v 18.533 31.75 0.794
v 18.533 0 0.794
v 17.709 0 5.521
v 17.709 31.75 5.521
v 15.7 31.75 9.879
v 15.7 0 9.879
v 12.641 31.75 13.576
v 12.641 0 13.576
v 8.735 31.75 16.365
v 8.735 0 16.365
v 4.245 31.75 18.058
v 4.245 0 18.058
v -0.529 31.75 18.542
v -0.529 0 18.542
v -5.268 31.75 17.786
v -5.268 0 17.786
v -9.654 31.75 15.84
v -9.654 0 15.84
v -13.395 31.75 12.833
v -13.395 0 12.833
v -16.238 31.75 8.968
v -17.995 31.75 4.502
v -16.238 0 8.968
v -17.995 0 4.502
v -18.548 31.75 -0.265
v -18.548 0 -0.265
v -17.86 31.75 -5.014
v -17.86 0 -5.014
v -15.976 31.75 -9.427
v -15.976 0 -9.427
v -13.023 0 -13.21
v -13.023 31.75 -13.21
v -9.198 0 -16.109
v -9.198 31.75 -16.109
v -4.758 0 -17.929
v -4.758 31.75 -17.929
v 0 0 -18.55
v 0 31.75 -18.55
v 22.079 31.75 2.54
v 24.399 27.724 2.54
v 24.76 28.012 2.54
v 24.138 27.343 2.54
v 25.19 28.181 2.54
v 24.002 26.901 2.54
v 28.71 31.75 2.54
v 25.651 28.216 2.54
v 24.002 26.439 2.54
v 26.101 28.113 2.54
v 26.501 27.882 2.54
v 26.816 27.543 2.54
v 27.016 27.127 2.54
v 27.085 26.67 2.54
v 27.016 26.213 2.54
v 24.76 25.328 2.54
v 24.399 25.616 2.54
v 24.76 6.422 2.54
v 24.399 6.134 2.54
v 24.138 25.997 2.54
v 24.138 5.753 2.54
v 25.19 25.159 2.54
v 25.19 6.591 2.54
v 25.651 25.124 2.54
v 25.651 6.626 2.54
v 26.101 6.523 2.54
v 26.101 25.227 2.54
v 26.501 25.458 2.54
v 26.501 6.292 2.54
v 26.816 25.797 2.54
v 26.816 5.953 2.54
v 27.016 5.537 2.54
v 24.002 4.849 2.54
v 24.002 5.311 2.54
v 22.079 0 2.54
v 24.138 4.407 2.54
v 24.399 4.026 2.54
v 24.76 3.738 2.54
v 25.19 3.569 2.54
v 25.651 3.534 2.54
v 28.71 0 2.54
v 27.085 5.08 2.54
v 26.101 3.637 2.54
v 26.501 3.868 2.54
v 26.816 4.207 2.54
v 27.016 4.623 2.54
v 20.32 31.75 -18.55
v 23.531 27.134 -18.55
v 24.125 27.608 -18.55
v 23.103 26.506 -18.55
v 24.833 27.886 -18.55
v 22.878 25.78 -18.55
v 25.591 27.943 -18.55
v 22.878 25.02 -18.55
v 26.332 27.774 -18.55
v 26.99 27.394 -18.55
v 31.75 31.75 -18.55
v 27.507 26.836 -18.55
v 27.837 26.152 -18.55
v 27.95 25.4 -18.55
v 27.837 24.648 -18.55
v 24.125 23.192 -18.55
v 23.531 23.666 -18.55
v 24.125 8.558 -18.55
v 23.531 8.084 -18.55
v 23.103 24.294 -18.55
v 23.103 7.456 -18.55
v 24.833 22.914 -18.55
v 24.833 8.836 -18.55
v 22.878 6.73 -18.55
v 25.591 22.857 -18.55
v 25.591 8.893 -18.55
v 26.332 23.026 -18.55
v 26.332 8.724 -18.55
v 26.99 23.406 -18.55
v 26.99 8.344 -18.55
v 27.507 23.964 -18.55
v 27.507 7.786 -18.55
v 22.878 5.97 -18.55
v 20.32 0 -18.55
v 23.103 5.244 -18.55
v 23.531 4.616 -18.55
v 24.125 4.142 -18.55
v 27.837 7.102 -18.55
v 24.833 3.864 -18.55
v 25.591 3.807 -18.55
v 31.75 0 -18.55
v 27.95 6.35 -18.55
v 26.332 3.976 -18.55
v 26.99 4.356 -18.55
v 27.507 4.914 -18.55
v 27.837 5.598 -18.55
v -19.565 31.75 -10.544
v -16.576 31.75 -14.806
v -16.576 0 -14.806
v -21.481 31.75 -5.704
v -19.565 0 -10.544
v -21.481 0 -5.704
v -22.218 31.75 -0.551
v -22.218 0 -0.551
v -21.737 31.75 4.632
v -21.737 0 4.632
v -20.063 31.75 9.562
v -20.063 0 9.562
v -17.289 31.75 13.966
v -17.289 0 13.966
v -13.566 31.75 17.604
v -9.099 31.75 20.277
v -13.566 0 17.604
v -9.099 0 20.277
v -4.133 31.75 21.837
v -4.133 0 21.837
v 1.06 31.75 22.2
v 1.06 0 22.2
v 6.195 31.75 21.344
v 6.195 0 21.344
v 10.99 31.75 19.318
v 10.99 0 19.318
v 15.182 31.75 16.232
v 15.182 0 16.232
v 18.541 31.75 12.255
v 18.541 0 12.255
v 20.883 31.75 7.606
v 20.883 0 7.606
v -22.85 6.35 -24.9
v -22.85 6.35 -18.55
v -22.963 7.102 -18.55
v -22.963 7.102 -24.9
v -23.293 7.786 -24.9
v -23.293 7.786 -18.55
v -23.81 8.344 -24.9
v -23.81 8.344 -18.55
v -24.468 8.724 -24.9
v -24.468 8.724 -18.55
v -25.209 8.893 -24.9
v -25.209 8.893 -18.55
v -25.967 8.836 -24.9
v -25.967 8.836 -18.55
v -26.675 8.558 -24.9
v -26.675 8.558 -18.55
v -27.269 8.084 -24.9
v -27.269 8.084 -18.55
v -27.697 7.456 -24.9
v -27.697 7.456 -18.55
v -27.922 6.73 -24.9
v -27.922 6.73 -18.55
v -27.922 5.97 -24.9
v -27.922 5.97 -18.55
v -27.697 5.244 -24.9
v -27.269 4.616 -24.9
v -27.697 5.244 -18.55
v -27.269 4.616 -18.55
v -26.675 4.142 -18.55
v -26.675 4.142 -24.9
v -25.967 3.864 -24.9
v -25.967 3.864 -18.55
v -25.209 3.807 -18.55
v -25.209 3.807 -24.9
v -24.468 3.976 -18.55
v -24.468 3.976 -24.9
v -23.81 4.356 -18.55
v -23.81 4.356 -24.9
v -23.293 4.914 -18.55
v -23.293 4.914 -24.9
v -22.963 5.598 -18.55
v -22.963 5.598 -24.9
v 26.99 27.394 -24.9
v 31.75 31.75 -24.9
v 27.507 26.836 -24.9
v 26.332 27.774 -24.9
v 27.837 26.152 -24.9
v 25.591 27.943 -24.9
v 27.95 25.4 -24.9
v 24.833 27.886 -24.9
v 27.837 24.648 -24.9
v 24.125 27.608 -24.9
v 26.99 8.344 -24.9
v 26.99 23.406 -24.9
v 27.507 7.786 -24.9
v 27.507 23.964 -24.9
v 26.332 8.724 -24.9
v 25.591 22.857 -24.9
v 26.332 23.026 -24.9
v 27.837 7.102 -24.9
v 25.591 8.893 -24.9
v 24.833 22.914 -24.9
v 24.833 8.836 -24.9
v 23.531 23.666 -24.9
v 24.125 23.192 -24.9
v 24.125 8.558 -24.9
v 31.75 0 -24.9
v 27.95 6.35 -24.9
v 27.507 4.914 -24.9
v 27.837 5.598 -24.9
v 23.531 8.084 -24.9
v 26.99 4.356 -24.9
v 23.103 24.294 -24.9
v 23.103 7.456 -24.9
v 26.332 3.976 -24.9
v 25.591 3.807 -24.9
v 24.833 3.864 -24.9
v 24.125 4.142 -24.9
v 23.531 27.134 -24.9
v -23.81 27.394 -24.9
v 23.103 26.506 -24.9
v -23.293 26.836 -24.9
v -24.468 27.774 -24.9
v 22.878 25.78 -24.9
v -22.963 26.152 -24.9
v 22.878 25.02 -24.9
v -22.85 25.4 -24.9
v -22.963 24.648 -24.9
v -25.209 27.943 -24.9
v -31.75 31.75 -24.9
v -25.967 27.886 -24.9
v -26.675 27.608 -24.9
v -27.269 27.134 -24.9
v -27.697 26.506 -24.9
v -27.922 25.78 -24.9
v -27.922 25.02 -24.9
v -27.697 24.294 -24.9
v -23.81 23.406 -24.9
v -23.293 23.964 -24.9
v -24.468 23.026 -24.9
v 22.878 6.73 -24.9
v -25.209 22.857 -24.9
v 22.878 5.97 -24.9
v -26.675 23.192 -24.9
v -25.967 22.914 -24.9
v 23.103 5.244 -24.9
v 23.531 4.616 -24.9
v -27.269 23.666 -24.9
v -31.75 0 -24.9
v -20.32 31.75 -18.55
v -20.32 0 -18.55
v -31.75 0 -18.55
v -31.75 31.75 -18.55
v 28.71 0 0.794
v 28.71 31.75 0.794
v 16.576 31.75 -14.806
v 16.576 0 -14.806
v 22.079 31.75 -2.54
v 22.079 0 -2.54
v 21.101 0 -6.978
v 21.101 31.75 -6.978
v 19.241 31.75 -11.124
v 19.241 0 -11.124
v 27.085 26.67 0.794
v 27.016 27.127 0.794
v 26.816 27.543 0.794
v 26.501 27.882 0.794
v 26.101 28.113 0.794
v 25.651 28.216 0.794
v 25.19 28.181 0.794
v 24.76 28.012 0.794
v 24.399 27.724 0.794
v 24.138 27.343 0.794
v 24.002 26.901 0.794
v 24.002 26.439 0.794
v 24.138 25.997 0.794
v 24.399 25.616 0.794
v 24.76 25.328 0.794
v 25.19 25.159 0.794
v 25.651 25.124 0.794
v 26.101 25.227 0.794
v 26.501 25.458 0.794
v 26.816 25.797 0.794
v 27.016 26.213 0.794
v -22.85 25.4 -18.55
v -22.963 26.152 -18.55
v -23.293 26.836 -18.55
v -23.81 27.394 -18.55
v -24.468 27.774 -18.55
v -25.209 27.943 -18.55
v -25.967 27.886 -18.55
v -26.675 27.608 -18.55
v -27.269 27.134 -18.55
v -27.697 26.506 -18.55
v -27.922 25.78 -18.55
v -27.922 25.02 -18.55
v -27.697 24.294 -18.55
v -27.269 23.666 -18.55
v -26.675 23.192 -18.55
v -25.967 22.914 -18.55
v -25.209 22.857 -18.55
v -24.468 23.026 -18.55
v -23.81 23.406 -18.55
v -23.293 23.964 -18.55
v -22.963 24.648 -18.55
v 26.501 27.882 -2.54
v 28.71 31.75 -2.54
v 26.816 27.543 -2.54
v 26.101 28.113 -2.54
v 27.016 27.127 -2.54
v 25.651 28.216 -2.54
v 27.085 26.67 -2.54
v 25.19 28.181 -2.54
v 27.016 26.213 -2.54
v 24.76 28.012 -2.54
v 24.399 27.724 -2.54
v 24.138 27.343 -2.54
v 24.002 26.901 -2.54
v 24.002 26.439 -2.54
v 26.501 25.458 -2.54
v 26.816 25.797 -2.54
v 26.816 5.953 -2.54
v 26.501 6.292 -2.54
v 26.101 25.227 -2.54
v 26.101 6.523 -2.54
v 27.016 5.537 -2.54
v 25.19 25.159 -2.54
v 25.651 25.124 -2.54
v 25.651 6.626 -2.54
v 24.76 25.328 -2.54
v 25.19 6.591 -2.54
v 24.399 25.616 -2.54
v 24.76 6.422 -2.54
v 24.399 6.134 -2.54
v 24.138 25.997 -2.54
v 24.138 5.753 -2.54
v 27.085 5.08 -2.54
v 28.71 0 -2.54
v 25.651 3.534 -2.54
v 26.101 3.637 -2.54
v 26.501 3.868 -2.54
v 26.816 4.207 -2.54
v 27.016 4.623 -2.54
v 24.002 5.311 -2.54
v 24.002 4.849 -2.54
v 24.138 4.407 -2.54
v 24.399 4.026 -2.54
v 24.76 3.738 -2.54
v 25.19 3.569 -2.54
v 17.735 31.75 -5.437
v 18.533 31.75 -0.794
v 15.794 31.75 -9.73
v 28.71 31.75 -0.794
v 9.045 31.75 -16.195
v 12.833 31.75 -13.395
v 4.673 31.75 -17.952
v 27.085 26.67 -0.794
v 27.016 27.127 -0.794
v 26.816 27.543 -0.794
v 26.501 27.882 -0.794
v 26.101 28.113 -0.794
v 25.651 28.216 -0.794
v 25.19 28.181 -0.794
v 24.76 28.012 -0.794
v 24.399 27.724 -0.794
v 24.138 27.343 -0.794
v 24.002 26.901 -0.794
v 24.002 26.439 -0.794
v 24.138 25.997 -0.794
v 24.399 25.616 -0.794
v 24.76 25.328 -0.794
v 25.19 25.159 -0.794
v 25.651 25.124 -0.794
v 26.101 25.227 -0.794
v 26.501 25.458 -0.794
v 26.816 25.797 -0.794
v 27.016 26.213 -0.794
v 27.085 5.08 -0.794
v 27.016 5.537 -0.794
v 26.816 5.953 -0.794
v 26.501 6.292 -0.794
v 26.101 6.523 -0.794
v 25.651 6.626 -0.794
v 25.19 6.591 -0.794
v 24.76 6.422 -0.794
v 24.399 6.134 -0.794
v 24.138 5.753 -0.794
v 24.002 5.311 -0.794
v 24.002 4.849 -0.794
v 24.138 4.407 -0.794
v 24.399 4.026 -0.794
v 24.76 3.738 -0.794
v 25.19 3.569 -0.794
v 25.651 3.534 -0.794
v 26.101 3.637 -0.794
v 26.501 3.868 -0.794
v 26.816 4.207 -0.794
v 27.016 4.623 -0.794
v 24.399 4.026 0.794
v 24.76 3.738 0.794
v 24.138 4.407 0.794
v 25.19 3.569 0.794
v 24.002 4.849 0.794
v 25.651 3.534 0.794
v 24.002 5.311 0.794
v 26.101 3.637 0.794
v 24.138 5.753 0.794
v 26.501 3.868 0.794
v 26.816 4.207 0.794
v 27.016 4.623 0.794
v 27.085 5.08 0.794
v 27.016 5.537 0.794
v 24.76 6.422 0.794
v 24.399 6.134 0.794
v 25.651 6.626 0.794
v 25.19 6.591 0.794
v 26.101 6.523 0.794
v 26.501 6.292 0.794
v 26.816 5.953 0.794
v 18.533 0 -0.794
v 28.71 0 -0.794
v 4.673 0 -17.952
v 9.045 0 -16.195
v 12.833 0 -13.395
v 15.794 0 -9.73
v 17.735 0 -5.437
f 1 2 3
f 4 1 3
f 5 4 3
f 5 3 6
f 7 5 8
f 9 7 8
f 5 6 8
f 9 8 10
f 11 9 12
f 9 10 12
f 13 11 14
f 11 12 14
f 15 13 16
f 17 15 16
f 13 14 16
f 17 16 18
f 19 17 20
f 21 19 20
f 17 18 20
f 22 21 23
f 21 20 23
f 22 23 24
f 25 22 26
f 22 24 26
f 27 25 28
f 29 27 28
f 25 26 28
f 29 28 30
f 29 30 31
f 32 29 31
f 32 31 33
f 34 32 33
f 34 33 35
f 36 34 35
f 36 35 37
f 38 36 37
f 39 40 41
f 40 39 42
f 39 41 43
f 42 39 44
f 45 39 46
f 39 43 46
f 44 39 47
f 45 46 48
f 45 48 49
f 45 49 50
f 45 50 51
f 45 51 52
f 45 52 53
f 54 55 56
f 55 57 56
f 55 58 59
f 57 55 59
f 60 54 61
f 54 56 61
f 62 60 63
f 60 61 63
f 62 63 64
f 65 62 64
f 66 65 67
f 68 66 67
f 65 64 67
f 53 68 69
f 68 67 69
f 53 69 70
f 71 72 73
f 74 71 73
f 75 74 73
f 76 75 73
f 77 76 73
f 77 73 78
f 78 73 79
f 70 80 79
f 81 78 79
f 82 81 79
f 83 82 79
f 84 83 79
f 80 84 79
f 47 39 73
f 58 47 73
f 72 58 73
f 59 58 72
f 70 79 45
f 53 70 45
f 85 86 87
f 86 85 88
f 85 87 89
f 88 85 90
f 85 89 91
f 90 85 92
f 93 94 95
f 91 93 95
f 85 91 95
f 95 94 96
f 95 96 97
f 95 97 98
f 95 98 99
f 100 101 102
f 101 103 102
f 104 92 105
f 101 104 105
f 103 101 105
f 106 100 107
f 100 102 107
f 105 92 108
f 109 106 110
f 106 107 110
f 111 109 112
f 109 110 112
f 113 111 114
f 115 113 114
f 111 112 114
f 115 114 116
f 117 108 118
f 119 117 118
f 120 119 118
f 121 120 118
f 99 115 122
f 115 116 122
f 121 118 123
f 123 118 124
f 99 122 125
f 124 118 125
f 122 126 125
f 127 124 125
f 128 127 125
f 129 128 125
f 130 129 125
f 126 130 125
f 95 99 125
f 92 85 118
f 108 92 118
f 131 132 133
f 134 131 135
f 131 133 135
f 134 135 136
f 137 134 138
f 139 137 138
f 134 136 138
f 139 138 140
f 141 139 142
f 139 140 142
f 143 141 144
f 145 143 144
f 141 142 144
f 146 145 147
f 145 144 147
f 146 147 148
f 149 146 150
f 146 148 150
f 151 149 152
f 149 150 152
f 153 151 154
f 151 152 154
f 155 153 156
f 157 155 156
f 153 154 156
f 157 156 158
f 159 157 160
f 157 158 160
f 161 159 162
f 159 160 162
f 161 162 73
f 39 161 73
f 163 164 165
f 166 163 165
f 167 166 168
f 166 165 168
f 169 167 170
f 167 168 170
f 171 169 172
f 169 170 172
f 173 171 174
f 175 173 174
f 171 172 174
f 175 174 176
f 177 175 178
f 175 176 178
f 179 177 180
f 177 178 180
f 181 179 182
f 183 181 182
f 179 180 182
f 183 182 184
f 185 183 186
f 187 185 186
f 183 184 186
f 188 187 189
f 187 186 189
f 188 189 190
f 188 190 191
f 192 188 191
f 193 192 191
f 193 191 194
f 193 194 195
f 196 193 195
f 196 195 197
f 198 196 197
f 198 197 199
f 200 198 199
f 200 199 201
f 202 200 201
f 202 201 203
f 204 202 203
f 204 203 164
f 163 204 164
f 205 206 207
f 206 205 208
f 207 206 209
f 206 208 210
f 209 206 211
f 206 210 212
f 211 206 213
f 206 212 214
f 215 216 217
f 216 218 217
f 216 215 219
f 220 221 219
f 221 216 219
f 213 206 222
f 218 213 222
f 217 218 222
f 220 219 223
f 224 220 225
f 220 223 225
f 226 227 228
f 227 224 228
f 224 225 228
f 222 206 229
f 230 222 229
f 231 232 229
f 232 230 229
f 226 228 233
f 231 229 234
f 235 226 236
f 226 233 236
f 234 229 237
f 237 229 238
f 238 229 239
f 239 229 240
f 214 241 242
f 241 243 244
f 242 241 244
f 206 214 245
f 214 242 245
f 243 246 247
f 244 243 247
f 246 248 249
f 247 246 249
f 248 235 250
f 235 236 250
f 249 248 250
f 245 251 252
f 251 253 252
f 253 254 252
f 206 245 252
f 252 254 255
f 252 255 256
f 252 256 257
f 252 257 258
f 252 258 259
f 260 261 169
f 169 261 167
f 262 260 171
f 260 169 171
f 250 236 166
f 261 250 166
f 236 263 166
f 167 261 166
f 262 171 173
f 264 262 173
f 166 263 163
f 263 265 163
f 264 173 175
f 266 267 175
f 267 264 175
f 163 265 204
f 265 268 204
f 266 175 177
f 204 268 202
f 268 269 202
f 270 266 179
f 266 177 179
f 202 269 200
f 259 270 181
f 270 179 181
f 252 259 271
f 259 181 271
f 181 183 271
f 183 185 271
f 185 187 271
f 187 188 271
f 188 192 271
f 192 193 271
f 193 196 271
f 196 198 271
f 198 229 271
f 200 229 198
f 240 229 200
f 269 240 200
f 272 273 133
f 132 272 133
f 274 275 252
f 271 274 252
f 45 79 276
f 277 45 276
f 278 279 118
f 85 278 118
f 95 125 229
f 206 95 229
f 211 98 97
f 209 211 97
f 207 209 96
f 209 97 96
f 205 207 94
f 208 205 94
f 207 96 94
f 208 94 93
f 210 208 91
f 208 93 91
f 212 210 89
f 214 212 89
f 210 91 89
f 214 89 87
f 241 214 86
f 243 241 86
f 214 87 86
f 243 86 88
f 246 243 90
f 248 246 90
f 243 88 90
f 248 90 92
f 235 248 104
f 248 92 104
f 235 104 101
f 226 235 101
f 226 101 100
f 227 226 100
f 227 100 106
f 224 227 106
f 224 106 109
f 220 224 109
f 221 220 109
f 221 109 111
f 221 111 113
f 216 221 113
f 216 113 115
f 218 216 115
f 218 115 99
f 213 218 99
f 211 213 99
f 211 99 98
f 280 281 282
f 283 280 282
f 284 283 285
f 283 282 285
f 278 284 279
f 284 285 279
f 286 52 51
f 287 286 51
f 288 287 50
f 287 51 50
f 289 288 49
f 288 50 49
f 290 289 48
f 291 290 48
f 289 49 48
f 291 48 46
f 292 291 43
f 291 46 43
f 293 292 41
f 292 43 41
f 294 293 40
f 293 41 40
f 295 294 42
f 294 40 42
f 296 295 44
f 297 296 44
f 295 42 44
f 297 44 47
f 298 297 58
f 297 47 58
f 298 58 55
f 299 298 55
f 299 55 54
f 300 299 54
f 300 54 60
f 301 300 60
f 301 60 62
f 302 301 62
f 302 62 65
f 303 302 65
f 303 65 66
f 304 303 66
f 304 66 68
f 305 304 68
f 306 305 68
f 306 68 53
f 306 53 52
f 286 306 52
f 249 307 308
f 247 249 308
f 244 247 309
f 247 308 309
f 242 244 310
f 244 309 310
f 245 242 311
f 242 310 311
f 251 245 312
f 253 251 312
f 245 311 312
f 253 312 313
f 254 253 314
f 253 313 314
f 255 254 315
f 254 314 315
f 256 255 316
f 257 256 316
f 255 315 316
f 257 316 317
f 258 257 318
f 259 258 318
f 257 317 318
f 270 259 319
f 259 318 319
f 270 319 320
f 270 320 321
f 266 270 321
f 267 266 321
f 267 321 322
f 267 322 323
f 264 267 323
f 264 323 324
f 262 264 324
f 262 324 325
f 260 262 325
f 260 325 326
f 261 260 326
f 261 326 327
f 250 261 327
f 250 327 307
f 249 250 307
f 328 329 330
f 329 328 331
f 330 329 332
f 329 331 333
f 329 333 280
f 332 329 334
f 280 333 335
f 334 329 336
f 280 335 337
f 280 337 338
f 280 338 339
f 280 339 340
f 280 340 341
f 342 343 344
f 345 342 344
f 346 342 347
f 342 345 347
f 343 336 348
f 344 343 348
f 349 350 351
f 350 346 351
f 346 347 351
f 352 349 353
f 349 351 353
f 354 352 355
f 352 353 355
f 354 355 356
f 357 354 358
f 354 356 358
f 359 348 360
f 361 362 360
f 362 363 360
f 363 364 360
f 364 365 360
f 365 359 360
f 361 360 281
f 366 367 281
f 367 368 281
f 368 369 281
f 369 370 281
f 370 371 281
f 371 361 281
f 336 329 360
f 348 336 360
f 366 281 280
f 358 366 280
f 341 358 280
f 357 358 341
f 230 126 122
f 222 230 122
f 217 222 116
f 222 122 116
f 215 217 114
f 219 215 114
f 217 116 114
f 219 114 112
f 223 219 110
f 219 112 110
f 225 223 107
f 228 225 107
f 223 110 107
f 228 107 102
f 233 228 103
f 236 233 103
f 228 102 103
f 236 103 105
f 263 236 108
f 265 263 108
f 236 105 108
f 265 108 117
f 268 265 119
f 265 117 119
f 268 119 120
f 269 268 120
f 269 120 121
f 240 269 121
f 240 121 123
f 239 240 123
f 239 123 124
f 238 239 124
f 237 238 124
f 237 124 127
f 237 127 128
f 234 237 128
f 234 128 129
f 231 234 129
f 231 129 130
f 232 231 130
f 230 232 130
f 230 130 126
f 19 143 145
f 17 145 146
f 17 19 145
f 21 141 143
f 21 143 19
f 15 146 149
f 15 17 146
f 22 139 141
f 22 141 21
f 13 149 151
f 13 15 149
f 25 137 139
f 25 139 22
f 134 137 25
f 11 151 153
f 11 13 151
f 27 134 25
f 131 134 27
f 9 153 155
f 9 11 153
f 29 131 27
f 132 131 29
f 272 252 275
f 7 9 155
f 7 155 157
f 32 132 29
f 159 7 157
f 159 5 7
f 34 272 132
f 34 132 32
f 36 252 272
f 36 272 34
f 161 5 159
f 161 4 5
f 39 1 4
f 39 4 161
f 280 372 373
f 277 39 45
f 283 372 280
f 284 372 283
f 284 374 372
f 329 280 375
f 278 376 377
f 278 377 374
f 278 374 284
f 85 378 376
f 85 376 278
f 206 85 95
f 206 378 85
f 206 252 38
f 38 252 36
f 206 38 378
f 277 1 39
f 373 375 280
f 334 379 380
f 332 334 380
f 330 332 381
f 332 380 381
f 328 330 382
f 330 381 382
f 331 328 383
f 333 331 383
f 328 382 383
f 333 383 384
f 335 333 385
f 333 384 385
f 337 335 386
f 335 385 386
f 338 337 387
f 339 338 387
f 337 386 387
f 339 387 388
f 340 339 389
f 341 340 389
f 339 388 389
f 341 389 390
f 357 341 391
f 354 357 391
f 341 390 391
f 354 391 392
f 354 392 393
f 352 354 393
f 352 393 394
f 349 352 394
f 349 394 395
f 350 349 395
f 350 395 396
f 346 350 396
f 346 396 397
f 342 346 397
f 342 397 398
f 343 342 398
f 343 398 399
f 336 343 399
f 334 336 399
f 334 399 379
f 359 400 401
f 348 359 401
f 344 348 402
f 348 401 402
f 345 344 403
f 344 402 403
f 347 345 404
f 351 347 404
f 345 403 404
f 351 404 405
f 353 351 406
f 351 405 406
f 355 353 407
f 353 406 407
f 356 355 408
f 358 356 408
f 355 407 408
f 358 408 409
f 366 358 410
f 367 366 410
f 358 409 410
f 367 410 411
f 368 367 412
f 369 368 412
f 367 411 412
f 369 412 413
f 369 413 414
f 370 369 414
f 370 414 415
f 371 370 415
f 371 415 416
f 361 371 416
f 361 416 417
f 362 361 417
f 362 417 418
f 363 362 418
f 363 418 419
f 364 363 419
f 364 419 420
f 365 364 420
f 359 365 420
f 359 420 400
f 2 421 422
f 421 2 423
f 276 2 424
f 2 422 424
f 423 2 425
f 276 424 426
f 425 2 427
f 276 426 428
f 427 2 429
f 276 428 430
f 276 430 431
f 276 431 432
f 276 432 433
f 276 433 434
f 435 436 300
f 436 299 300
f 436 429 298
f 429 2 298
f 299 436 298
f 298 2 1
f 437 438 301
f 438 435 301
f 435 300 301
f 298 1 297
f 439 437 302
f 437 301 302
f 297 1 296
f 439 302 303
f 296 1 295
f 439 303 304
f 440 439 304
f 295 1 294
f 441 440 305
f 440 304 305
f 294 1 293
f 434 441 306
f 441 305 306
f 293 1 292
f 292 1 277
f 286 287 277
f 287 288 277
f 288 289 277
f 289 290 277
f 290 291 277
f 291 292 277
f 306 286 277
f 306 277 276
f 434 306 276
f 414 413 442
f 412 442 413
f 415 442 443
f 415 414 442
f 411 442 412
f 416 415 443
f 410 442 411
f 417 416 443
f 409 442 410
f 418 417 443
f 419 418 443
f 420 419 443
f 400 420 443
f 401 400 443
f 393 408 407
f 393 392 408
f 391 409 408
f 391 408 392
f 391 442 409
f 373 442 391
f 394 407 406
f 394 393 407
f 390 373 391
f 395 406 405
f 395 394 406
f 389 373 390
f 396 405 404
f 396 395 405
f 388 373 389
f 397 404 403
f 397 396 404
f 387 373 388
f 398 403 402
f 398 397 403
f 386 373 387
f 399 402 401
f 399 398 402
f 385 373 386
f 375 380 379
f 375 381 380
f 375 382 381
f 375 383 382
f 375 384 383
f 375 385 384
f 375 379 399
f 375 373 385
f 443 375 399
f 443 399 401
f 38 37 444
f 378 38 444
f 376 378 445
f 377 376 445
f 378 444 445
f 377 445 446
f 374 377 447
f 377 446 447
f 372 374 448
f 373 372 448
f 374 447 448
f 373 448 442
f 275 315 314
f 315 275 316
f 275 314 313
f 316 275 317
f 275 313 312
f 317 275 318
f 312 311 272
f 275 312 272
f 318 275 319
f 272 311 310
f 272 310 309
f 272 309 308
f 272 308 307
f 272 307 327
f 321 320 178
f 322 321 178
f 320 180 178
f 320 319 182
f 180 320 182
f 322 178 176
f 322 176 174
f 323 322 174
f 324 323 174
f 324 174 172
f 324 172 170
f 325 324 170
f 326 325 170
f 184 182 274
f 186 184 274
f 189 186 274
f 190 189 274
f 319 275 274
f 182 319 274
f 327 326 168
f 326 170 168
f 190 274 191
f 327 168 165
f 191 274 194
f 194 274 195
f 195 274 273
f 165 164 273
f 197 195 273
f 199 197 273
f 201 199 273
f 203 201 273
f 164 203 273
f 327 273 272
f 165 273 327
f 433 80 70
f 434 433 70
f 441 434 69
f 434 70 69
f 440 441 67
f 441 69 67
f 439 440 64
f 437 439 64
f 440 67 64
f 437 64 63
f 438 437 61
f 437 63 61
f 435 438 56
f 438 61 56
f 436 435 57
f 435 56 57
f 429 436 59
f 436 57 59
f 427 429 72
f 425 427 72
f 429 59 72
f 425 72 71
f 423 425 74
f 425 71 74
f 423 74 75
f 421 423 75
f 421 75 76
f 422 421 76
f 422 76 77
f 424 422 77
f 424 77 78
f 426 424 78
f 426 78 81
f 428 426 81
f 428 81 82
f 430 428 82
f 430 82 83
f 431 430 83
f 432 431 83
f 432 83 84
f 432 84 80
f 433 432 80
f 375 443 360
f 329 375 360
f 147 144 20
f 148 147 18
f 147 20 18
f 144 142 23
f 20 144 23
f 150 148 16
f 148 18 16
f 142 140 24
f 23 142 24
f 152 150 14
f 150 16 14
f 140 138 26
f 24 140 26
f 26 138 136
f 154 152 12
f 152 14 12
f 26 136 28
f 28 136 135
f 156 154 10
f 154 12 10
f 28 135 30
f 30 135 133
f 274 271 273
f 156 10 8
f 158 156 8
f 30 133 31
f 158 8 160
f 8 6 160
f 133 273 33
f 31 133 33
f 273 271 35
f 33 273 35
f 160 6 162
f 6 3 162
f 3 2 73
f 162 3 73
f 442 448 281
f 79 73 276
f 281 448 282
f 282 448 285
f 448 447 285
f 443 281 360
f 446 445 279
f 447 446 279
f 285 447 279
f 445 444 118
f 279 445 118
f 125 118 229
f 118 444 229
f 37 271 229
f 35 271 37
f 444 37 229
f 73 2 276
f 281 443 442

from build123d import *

# Parameters (mm, degrees)
SKETCH1_W           = 3
SKETCH1_H           = 5.08
SKETCH1_W_2         = 1.910737821
SKETCH1_W_3         = 5
SKETCH1_H_2         = 6.35
SKETCH1_W_4         = 3.175
BOSS_EXTRUDE1_DEPTH = 31.75
SKETCH2_W           = 21.412406597
SKETCH2_H           = 1.5875
CUT_EXTRUDE1_DEPTH  = 31.75
CUT_EXTRUDE2_REACH  = 54.622
SKETCH3_R           = 1.55
SKETCH4_R           = 2.55
CUT_EXTRUDE3_DEPTH  = 31.75


with BuildPart() as part:
    # Sketch1 → Boss-Extrude1 (new body)
    with BuildSketch(Plane(origin=(0, 0, 0), x_dir=(1, 0, 0), z_dir=(0, 1, 0))):
        with BuildLine():
            ThreePointArc((18.55, 0), (-13.116830791, -13.116830791), (0, 18.55))
            Line((0, 18.55), (-12.241246873, 18.55))
            ThreePointArc((-12.241246873, 18.55), (-14.529510105, 16.817965427), (-16.575509472, 14.805509472))
            ThreePointArc((-16.575509472, 14.805509472), (-9.098891287, -20.277100442), (22.079380086, -2.54))
            Line((22.079380086, -2.54), (18.55, -2.54))
            Line((18.55, -2.54), (18.55, 0))
        make_face()
        with BuildLine():
            Line((12.241246873, 18.55), (0, 18.55))
            ThreePointArc((0, 18.55), (13.116830791, 13.116830791), (18.55, 0))
            Line((18.55, 0), (18.55, 2.54))
            Line((18.55, 2.54), (22.079380086, 2.54))
            ThreePointArc((22.079380086, 2.54), (20.277100442, 9.098891287), (16.575509472, 14.805509472))
            ThreePointArc((16.575509472, 14.805509472), (14.529510105, 16.817965427), (12.241246873, 18.55))
        make_face()
        with BuildLine():
            Line((18.55, 2.54), (18.55, 0))
            Line((18.55, 0), (18.55, -2.54))
            Line((18.55, -2.54), (22.079380086, -2.54))
            ThreePointArc((22.079380086, -2.54), (22.188565157, -1.27208541), (22.225, 0))
            ThreePointArc((22.225, 0), (22.188565157, 1.27208541), (22.079380086, 2.54))
            Line((22.079380086, 2.54), (18.55, 2.54))
        make_face()
        with BuildLine():
            ThreePointArc((22.225, 0), (22.188565157, -1.27208541), (22.079380086, -2.54))
            Line((22.079380086, -2.54), (23.799262179, -2.54))
            Line((23.799262179, -2.54), (23.799262179, 2.54))
            Line((23.799262179, 2.54), (22.079380086, 2.54))
            ThreePointArc((22.079380086, 2.54), (22.188565157, 1.27208541), (22.225, 0))
        make_face()
        with Locations((25.299262179, 0)):
            Rectangle(SKETCH1_W, SKETCH1_H)
        with Locations((27.75463109, 0)):
            Rectangle(SKETCH1_W_2, SKETCH1_H)
        with BuildLine():
            Line((-20.32, 18.55), (-12.241246873, 18.55))
            ThreePointArc((-12.241246873, 18.55), (0, 22.225), (12.241246873, 18.55))
            Line((12.241246873, 18.55), (20.32, 18.55))
            Line((20.32, 18.55), (31.75, 18.55))
            Line((31.75, 18.55), (31.75, 24.9))
            Line((31.75, 24.9), (-23.575, 24.9))
            Line((-23.575, 24.9), (-23.575, 18.55))
            Line((-23.575, 18.55), (-20.32, 18.55))
        make_face()
        with BuildLine():
            Line((-12.241246873, 18.55), (0, 18.55))
            Line((0, 18.55), (12.241246873, 18.55))
            ThreePointArc((12.241246873, 18.55), (0, 22.225), (-12.241246873, 18.55))
        make_face()
        with BuildLine():
            Line((20.32, 18.55), (12.241246873, 18.55))
            ThreePointArc((12.241246873, 18.55), (14.529510105, 16.817965427), (16.575509472, 14.805509472))
            Line((16.575509472, 14.805509472), (20.32, 18.55))
        make_face()
        with BuildLine():
            ThreePointArc((-16.575509472, 14.805509472), (-14.529510105, 16.817965427), (-12.241246873, 18.55))
            Line((-12.241246873, 18.55), (-20.32, 18.55))
            Line((-20.32, 18.55), (-16.575509472, 14.805509472))
        make_face()
        with Locations((-26.075, 21.725)):
            Rectangle(SKETCH1_W_3, SKETCH1_H_2)
        with Locations((-30.1625, 21.725)):
            Rectangle(SKETCH1_W_4, SKETCH1_H_2)
    extrude(amount=BOSS_EXTRUDE1_DEPTH)

    # Sketch2 → Cut-Extrude1 (cut)
    with BuildSketch(Plane(origin=(0, 31.75, 0), x_dir=(1, 0, 0), z_dir=(0, 1, 0))):
        with Locations((22.027012195, 0)):
            Rectangle(SKETCH2_W, SKETCH2_H)
    extrude(amount=-CUT_EXTRUDE1_DEPTH, mode=Mode.SUBTRACT)

    # Cut-Extrude2: up to this face of the body (flat: up to its plane)
    cut_extrude2_end = Plane(part.part.faces().sort_by_distance((25.394690043, 15.875, -2.54))[0])
    # Sketch3 → Cut-Extrude2 (cut, up to the picked face)
    with BuildSketch(Plane.XY.offset(2.54), mode=Mode.PRIVATE) as cut_extrude2_sk1:
        with Locations((25.535, 5.08)):
            Circle(SKETCH3_R)
    cut_extrude2_tool1 = split(extrude(cut_extrude2_sk1.sketch, amount=-CUT_EXTRUDE2_REACH, mode=Mode.PRIVATE), bisect_by=cut_extrude2_end, keep=Keep.BOTH, mode=Mode.PRIVATE)
    # Sketch3 → Cut-Extrude2 (cut, up to the picked face)
    with BuildSketch(Plane.XY.offset(2.54), mode=Mode.PRIVATE) as cut_extrude2_sk2:
        with Locations((25.535, 26.67)):
            Circle(SKETCH3_R)
    cut_extrude2_tool2 = split(extrude(cut_extrude2_sk2.sketch, amount=-CUT_EXTRUDE2_REACH, mode=Mode.PRIVATE), bisect_by=cut_extrude2_end, keep=Keep.BOTH, mode=Mode.PRIVATE)
    add(cut_extrude2_tool1.solids().sort_by(Axis((25.535, 5.08, 2.54), (0, 0, -1)))[0], mode=Mode.SUBTRACT)
    add(cut_extrude2_tool2.solids().sort_by(Axis((25.535, 26.67, 2.54), (0, 0, -1)))[0], mode=Mode.SUBTRACT)

    # Sketch4 → Cut-Extrude3 (cut)
    with BuildSketch(Plane.XY.offset(-18.55)):
        with Locations((-25.4, 6.35)):
            Circle(SKETCH4_R)
        with Locations((-25.4, 25.4)):
            Circle(SKETCH4_R)
        with Locations((25.4, 25.4)):
            Circle(SKETCH4_R)
        with Locations((25.4, 6.35)):
            Circle(SKETCH4_R)
    extrude(amount=-CUT_EXTRUDE3_DEPTH, mode=Mode.SUBTRACT)


solid = part.part
